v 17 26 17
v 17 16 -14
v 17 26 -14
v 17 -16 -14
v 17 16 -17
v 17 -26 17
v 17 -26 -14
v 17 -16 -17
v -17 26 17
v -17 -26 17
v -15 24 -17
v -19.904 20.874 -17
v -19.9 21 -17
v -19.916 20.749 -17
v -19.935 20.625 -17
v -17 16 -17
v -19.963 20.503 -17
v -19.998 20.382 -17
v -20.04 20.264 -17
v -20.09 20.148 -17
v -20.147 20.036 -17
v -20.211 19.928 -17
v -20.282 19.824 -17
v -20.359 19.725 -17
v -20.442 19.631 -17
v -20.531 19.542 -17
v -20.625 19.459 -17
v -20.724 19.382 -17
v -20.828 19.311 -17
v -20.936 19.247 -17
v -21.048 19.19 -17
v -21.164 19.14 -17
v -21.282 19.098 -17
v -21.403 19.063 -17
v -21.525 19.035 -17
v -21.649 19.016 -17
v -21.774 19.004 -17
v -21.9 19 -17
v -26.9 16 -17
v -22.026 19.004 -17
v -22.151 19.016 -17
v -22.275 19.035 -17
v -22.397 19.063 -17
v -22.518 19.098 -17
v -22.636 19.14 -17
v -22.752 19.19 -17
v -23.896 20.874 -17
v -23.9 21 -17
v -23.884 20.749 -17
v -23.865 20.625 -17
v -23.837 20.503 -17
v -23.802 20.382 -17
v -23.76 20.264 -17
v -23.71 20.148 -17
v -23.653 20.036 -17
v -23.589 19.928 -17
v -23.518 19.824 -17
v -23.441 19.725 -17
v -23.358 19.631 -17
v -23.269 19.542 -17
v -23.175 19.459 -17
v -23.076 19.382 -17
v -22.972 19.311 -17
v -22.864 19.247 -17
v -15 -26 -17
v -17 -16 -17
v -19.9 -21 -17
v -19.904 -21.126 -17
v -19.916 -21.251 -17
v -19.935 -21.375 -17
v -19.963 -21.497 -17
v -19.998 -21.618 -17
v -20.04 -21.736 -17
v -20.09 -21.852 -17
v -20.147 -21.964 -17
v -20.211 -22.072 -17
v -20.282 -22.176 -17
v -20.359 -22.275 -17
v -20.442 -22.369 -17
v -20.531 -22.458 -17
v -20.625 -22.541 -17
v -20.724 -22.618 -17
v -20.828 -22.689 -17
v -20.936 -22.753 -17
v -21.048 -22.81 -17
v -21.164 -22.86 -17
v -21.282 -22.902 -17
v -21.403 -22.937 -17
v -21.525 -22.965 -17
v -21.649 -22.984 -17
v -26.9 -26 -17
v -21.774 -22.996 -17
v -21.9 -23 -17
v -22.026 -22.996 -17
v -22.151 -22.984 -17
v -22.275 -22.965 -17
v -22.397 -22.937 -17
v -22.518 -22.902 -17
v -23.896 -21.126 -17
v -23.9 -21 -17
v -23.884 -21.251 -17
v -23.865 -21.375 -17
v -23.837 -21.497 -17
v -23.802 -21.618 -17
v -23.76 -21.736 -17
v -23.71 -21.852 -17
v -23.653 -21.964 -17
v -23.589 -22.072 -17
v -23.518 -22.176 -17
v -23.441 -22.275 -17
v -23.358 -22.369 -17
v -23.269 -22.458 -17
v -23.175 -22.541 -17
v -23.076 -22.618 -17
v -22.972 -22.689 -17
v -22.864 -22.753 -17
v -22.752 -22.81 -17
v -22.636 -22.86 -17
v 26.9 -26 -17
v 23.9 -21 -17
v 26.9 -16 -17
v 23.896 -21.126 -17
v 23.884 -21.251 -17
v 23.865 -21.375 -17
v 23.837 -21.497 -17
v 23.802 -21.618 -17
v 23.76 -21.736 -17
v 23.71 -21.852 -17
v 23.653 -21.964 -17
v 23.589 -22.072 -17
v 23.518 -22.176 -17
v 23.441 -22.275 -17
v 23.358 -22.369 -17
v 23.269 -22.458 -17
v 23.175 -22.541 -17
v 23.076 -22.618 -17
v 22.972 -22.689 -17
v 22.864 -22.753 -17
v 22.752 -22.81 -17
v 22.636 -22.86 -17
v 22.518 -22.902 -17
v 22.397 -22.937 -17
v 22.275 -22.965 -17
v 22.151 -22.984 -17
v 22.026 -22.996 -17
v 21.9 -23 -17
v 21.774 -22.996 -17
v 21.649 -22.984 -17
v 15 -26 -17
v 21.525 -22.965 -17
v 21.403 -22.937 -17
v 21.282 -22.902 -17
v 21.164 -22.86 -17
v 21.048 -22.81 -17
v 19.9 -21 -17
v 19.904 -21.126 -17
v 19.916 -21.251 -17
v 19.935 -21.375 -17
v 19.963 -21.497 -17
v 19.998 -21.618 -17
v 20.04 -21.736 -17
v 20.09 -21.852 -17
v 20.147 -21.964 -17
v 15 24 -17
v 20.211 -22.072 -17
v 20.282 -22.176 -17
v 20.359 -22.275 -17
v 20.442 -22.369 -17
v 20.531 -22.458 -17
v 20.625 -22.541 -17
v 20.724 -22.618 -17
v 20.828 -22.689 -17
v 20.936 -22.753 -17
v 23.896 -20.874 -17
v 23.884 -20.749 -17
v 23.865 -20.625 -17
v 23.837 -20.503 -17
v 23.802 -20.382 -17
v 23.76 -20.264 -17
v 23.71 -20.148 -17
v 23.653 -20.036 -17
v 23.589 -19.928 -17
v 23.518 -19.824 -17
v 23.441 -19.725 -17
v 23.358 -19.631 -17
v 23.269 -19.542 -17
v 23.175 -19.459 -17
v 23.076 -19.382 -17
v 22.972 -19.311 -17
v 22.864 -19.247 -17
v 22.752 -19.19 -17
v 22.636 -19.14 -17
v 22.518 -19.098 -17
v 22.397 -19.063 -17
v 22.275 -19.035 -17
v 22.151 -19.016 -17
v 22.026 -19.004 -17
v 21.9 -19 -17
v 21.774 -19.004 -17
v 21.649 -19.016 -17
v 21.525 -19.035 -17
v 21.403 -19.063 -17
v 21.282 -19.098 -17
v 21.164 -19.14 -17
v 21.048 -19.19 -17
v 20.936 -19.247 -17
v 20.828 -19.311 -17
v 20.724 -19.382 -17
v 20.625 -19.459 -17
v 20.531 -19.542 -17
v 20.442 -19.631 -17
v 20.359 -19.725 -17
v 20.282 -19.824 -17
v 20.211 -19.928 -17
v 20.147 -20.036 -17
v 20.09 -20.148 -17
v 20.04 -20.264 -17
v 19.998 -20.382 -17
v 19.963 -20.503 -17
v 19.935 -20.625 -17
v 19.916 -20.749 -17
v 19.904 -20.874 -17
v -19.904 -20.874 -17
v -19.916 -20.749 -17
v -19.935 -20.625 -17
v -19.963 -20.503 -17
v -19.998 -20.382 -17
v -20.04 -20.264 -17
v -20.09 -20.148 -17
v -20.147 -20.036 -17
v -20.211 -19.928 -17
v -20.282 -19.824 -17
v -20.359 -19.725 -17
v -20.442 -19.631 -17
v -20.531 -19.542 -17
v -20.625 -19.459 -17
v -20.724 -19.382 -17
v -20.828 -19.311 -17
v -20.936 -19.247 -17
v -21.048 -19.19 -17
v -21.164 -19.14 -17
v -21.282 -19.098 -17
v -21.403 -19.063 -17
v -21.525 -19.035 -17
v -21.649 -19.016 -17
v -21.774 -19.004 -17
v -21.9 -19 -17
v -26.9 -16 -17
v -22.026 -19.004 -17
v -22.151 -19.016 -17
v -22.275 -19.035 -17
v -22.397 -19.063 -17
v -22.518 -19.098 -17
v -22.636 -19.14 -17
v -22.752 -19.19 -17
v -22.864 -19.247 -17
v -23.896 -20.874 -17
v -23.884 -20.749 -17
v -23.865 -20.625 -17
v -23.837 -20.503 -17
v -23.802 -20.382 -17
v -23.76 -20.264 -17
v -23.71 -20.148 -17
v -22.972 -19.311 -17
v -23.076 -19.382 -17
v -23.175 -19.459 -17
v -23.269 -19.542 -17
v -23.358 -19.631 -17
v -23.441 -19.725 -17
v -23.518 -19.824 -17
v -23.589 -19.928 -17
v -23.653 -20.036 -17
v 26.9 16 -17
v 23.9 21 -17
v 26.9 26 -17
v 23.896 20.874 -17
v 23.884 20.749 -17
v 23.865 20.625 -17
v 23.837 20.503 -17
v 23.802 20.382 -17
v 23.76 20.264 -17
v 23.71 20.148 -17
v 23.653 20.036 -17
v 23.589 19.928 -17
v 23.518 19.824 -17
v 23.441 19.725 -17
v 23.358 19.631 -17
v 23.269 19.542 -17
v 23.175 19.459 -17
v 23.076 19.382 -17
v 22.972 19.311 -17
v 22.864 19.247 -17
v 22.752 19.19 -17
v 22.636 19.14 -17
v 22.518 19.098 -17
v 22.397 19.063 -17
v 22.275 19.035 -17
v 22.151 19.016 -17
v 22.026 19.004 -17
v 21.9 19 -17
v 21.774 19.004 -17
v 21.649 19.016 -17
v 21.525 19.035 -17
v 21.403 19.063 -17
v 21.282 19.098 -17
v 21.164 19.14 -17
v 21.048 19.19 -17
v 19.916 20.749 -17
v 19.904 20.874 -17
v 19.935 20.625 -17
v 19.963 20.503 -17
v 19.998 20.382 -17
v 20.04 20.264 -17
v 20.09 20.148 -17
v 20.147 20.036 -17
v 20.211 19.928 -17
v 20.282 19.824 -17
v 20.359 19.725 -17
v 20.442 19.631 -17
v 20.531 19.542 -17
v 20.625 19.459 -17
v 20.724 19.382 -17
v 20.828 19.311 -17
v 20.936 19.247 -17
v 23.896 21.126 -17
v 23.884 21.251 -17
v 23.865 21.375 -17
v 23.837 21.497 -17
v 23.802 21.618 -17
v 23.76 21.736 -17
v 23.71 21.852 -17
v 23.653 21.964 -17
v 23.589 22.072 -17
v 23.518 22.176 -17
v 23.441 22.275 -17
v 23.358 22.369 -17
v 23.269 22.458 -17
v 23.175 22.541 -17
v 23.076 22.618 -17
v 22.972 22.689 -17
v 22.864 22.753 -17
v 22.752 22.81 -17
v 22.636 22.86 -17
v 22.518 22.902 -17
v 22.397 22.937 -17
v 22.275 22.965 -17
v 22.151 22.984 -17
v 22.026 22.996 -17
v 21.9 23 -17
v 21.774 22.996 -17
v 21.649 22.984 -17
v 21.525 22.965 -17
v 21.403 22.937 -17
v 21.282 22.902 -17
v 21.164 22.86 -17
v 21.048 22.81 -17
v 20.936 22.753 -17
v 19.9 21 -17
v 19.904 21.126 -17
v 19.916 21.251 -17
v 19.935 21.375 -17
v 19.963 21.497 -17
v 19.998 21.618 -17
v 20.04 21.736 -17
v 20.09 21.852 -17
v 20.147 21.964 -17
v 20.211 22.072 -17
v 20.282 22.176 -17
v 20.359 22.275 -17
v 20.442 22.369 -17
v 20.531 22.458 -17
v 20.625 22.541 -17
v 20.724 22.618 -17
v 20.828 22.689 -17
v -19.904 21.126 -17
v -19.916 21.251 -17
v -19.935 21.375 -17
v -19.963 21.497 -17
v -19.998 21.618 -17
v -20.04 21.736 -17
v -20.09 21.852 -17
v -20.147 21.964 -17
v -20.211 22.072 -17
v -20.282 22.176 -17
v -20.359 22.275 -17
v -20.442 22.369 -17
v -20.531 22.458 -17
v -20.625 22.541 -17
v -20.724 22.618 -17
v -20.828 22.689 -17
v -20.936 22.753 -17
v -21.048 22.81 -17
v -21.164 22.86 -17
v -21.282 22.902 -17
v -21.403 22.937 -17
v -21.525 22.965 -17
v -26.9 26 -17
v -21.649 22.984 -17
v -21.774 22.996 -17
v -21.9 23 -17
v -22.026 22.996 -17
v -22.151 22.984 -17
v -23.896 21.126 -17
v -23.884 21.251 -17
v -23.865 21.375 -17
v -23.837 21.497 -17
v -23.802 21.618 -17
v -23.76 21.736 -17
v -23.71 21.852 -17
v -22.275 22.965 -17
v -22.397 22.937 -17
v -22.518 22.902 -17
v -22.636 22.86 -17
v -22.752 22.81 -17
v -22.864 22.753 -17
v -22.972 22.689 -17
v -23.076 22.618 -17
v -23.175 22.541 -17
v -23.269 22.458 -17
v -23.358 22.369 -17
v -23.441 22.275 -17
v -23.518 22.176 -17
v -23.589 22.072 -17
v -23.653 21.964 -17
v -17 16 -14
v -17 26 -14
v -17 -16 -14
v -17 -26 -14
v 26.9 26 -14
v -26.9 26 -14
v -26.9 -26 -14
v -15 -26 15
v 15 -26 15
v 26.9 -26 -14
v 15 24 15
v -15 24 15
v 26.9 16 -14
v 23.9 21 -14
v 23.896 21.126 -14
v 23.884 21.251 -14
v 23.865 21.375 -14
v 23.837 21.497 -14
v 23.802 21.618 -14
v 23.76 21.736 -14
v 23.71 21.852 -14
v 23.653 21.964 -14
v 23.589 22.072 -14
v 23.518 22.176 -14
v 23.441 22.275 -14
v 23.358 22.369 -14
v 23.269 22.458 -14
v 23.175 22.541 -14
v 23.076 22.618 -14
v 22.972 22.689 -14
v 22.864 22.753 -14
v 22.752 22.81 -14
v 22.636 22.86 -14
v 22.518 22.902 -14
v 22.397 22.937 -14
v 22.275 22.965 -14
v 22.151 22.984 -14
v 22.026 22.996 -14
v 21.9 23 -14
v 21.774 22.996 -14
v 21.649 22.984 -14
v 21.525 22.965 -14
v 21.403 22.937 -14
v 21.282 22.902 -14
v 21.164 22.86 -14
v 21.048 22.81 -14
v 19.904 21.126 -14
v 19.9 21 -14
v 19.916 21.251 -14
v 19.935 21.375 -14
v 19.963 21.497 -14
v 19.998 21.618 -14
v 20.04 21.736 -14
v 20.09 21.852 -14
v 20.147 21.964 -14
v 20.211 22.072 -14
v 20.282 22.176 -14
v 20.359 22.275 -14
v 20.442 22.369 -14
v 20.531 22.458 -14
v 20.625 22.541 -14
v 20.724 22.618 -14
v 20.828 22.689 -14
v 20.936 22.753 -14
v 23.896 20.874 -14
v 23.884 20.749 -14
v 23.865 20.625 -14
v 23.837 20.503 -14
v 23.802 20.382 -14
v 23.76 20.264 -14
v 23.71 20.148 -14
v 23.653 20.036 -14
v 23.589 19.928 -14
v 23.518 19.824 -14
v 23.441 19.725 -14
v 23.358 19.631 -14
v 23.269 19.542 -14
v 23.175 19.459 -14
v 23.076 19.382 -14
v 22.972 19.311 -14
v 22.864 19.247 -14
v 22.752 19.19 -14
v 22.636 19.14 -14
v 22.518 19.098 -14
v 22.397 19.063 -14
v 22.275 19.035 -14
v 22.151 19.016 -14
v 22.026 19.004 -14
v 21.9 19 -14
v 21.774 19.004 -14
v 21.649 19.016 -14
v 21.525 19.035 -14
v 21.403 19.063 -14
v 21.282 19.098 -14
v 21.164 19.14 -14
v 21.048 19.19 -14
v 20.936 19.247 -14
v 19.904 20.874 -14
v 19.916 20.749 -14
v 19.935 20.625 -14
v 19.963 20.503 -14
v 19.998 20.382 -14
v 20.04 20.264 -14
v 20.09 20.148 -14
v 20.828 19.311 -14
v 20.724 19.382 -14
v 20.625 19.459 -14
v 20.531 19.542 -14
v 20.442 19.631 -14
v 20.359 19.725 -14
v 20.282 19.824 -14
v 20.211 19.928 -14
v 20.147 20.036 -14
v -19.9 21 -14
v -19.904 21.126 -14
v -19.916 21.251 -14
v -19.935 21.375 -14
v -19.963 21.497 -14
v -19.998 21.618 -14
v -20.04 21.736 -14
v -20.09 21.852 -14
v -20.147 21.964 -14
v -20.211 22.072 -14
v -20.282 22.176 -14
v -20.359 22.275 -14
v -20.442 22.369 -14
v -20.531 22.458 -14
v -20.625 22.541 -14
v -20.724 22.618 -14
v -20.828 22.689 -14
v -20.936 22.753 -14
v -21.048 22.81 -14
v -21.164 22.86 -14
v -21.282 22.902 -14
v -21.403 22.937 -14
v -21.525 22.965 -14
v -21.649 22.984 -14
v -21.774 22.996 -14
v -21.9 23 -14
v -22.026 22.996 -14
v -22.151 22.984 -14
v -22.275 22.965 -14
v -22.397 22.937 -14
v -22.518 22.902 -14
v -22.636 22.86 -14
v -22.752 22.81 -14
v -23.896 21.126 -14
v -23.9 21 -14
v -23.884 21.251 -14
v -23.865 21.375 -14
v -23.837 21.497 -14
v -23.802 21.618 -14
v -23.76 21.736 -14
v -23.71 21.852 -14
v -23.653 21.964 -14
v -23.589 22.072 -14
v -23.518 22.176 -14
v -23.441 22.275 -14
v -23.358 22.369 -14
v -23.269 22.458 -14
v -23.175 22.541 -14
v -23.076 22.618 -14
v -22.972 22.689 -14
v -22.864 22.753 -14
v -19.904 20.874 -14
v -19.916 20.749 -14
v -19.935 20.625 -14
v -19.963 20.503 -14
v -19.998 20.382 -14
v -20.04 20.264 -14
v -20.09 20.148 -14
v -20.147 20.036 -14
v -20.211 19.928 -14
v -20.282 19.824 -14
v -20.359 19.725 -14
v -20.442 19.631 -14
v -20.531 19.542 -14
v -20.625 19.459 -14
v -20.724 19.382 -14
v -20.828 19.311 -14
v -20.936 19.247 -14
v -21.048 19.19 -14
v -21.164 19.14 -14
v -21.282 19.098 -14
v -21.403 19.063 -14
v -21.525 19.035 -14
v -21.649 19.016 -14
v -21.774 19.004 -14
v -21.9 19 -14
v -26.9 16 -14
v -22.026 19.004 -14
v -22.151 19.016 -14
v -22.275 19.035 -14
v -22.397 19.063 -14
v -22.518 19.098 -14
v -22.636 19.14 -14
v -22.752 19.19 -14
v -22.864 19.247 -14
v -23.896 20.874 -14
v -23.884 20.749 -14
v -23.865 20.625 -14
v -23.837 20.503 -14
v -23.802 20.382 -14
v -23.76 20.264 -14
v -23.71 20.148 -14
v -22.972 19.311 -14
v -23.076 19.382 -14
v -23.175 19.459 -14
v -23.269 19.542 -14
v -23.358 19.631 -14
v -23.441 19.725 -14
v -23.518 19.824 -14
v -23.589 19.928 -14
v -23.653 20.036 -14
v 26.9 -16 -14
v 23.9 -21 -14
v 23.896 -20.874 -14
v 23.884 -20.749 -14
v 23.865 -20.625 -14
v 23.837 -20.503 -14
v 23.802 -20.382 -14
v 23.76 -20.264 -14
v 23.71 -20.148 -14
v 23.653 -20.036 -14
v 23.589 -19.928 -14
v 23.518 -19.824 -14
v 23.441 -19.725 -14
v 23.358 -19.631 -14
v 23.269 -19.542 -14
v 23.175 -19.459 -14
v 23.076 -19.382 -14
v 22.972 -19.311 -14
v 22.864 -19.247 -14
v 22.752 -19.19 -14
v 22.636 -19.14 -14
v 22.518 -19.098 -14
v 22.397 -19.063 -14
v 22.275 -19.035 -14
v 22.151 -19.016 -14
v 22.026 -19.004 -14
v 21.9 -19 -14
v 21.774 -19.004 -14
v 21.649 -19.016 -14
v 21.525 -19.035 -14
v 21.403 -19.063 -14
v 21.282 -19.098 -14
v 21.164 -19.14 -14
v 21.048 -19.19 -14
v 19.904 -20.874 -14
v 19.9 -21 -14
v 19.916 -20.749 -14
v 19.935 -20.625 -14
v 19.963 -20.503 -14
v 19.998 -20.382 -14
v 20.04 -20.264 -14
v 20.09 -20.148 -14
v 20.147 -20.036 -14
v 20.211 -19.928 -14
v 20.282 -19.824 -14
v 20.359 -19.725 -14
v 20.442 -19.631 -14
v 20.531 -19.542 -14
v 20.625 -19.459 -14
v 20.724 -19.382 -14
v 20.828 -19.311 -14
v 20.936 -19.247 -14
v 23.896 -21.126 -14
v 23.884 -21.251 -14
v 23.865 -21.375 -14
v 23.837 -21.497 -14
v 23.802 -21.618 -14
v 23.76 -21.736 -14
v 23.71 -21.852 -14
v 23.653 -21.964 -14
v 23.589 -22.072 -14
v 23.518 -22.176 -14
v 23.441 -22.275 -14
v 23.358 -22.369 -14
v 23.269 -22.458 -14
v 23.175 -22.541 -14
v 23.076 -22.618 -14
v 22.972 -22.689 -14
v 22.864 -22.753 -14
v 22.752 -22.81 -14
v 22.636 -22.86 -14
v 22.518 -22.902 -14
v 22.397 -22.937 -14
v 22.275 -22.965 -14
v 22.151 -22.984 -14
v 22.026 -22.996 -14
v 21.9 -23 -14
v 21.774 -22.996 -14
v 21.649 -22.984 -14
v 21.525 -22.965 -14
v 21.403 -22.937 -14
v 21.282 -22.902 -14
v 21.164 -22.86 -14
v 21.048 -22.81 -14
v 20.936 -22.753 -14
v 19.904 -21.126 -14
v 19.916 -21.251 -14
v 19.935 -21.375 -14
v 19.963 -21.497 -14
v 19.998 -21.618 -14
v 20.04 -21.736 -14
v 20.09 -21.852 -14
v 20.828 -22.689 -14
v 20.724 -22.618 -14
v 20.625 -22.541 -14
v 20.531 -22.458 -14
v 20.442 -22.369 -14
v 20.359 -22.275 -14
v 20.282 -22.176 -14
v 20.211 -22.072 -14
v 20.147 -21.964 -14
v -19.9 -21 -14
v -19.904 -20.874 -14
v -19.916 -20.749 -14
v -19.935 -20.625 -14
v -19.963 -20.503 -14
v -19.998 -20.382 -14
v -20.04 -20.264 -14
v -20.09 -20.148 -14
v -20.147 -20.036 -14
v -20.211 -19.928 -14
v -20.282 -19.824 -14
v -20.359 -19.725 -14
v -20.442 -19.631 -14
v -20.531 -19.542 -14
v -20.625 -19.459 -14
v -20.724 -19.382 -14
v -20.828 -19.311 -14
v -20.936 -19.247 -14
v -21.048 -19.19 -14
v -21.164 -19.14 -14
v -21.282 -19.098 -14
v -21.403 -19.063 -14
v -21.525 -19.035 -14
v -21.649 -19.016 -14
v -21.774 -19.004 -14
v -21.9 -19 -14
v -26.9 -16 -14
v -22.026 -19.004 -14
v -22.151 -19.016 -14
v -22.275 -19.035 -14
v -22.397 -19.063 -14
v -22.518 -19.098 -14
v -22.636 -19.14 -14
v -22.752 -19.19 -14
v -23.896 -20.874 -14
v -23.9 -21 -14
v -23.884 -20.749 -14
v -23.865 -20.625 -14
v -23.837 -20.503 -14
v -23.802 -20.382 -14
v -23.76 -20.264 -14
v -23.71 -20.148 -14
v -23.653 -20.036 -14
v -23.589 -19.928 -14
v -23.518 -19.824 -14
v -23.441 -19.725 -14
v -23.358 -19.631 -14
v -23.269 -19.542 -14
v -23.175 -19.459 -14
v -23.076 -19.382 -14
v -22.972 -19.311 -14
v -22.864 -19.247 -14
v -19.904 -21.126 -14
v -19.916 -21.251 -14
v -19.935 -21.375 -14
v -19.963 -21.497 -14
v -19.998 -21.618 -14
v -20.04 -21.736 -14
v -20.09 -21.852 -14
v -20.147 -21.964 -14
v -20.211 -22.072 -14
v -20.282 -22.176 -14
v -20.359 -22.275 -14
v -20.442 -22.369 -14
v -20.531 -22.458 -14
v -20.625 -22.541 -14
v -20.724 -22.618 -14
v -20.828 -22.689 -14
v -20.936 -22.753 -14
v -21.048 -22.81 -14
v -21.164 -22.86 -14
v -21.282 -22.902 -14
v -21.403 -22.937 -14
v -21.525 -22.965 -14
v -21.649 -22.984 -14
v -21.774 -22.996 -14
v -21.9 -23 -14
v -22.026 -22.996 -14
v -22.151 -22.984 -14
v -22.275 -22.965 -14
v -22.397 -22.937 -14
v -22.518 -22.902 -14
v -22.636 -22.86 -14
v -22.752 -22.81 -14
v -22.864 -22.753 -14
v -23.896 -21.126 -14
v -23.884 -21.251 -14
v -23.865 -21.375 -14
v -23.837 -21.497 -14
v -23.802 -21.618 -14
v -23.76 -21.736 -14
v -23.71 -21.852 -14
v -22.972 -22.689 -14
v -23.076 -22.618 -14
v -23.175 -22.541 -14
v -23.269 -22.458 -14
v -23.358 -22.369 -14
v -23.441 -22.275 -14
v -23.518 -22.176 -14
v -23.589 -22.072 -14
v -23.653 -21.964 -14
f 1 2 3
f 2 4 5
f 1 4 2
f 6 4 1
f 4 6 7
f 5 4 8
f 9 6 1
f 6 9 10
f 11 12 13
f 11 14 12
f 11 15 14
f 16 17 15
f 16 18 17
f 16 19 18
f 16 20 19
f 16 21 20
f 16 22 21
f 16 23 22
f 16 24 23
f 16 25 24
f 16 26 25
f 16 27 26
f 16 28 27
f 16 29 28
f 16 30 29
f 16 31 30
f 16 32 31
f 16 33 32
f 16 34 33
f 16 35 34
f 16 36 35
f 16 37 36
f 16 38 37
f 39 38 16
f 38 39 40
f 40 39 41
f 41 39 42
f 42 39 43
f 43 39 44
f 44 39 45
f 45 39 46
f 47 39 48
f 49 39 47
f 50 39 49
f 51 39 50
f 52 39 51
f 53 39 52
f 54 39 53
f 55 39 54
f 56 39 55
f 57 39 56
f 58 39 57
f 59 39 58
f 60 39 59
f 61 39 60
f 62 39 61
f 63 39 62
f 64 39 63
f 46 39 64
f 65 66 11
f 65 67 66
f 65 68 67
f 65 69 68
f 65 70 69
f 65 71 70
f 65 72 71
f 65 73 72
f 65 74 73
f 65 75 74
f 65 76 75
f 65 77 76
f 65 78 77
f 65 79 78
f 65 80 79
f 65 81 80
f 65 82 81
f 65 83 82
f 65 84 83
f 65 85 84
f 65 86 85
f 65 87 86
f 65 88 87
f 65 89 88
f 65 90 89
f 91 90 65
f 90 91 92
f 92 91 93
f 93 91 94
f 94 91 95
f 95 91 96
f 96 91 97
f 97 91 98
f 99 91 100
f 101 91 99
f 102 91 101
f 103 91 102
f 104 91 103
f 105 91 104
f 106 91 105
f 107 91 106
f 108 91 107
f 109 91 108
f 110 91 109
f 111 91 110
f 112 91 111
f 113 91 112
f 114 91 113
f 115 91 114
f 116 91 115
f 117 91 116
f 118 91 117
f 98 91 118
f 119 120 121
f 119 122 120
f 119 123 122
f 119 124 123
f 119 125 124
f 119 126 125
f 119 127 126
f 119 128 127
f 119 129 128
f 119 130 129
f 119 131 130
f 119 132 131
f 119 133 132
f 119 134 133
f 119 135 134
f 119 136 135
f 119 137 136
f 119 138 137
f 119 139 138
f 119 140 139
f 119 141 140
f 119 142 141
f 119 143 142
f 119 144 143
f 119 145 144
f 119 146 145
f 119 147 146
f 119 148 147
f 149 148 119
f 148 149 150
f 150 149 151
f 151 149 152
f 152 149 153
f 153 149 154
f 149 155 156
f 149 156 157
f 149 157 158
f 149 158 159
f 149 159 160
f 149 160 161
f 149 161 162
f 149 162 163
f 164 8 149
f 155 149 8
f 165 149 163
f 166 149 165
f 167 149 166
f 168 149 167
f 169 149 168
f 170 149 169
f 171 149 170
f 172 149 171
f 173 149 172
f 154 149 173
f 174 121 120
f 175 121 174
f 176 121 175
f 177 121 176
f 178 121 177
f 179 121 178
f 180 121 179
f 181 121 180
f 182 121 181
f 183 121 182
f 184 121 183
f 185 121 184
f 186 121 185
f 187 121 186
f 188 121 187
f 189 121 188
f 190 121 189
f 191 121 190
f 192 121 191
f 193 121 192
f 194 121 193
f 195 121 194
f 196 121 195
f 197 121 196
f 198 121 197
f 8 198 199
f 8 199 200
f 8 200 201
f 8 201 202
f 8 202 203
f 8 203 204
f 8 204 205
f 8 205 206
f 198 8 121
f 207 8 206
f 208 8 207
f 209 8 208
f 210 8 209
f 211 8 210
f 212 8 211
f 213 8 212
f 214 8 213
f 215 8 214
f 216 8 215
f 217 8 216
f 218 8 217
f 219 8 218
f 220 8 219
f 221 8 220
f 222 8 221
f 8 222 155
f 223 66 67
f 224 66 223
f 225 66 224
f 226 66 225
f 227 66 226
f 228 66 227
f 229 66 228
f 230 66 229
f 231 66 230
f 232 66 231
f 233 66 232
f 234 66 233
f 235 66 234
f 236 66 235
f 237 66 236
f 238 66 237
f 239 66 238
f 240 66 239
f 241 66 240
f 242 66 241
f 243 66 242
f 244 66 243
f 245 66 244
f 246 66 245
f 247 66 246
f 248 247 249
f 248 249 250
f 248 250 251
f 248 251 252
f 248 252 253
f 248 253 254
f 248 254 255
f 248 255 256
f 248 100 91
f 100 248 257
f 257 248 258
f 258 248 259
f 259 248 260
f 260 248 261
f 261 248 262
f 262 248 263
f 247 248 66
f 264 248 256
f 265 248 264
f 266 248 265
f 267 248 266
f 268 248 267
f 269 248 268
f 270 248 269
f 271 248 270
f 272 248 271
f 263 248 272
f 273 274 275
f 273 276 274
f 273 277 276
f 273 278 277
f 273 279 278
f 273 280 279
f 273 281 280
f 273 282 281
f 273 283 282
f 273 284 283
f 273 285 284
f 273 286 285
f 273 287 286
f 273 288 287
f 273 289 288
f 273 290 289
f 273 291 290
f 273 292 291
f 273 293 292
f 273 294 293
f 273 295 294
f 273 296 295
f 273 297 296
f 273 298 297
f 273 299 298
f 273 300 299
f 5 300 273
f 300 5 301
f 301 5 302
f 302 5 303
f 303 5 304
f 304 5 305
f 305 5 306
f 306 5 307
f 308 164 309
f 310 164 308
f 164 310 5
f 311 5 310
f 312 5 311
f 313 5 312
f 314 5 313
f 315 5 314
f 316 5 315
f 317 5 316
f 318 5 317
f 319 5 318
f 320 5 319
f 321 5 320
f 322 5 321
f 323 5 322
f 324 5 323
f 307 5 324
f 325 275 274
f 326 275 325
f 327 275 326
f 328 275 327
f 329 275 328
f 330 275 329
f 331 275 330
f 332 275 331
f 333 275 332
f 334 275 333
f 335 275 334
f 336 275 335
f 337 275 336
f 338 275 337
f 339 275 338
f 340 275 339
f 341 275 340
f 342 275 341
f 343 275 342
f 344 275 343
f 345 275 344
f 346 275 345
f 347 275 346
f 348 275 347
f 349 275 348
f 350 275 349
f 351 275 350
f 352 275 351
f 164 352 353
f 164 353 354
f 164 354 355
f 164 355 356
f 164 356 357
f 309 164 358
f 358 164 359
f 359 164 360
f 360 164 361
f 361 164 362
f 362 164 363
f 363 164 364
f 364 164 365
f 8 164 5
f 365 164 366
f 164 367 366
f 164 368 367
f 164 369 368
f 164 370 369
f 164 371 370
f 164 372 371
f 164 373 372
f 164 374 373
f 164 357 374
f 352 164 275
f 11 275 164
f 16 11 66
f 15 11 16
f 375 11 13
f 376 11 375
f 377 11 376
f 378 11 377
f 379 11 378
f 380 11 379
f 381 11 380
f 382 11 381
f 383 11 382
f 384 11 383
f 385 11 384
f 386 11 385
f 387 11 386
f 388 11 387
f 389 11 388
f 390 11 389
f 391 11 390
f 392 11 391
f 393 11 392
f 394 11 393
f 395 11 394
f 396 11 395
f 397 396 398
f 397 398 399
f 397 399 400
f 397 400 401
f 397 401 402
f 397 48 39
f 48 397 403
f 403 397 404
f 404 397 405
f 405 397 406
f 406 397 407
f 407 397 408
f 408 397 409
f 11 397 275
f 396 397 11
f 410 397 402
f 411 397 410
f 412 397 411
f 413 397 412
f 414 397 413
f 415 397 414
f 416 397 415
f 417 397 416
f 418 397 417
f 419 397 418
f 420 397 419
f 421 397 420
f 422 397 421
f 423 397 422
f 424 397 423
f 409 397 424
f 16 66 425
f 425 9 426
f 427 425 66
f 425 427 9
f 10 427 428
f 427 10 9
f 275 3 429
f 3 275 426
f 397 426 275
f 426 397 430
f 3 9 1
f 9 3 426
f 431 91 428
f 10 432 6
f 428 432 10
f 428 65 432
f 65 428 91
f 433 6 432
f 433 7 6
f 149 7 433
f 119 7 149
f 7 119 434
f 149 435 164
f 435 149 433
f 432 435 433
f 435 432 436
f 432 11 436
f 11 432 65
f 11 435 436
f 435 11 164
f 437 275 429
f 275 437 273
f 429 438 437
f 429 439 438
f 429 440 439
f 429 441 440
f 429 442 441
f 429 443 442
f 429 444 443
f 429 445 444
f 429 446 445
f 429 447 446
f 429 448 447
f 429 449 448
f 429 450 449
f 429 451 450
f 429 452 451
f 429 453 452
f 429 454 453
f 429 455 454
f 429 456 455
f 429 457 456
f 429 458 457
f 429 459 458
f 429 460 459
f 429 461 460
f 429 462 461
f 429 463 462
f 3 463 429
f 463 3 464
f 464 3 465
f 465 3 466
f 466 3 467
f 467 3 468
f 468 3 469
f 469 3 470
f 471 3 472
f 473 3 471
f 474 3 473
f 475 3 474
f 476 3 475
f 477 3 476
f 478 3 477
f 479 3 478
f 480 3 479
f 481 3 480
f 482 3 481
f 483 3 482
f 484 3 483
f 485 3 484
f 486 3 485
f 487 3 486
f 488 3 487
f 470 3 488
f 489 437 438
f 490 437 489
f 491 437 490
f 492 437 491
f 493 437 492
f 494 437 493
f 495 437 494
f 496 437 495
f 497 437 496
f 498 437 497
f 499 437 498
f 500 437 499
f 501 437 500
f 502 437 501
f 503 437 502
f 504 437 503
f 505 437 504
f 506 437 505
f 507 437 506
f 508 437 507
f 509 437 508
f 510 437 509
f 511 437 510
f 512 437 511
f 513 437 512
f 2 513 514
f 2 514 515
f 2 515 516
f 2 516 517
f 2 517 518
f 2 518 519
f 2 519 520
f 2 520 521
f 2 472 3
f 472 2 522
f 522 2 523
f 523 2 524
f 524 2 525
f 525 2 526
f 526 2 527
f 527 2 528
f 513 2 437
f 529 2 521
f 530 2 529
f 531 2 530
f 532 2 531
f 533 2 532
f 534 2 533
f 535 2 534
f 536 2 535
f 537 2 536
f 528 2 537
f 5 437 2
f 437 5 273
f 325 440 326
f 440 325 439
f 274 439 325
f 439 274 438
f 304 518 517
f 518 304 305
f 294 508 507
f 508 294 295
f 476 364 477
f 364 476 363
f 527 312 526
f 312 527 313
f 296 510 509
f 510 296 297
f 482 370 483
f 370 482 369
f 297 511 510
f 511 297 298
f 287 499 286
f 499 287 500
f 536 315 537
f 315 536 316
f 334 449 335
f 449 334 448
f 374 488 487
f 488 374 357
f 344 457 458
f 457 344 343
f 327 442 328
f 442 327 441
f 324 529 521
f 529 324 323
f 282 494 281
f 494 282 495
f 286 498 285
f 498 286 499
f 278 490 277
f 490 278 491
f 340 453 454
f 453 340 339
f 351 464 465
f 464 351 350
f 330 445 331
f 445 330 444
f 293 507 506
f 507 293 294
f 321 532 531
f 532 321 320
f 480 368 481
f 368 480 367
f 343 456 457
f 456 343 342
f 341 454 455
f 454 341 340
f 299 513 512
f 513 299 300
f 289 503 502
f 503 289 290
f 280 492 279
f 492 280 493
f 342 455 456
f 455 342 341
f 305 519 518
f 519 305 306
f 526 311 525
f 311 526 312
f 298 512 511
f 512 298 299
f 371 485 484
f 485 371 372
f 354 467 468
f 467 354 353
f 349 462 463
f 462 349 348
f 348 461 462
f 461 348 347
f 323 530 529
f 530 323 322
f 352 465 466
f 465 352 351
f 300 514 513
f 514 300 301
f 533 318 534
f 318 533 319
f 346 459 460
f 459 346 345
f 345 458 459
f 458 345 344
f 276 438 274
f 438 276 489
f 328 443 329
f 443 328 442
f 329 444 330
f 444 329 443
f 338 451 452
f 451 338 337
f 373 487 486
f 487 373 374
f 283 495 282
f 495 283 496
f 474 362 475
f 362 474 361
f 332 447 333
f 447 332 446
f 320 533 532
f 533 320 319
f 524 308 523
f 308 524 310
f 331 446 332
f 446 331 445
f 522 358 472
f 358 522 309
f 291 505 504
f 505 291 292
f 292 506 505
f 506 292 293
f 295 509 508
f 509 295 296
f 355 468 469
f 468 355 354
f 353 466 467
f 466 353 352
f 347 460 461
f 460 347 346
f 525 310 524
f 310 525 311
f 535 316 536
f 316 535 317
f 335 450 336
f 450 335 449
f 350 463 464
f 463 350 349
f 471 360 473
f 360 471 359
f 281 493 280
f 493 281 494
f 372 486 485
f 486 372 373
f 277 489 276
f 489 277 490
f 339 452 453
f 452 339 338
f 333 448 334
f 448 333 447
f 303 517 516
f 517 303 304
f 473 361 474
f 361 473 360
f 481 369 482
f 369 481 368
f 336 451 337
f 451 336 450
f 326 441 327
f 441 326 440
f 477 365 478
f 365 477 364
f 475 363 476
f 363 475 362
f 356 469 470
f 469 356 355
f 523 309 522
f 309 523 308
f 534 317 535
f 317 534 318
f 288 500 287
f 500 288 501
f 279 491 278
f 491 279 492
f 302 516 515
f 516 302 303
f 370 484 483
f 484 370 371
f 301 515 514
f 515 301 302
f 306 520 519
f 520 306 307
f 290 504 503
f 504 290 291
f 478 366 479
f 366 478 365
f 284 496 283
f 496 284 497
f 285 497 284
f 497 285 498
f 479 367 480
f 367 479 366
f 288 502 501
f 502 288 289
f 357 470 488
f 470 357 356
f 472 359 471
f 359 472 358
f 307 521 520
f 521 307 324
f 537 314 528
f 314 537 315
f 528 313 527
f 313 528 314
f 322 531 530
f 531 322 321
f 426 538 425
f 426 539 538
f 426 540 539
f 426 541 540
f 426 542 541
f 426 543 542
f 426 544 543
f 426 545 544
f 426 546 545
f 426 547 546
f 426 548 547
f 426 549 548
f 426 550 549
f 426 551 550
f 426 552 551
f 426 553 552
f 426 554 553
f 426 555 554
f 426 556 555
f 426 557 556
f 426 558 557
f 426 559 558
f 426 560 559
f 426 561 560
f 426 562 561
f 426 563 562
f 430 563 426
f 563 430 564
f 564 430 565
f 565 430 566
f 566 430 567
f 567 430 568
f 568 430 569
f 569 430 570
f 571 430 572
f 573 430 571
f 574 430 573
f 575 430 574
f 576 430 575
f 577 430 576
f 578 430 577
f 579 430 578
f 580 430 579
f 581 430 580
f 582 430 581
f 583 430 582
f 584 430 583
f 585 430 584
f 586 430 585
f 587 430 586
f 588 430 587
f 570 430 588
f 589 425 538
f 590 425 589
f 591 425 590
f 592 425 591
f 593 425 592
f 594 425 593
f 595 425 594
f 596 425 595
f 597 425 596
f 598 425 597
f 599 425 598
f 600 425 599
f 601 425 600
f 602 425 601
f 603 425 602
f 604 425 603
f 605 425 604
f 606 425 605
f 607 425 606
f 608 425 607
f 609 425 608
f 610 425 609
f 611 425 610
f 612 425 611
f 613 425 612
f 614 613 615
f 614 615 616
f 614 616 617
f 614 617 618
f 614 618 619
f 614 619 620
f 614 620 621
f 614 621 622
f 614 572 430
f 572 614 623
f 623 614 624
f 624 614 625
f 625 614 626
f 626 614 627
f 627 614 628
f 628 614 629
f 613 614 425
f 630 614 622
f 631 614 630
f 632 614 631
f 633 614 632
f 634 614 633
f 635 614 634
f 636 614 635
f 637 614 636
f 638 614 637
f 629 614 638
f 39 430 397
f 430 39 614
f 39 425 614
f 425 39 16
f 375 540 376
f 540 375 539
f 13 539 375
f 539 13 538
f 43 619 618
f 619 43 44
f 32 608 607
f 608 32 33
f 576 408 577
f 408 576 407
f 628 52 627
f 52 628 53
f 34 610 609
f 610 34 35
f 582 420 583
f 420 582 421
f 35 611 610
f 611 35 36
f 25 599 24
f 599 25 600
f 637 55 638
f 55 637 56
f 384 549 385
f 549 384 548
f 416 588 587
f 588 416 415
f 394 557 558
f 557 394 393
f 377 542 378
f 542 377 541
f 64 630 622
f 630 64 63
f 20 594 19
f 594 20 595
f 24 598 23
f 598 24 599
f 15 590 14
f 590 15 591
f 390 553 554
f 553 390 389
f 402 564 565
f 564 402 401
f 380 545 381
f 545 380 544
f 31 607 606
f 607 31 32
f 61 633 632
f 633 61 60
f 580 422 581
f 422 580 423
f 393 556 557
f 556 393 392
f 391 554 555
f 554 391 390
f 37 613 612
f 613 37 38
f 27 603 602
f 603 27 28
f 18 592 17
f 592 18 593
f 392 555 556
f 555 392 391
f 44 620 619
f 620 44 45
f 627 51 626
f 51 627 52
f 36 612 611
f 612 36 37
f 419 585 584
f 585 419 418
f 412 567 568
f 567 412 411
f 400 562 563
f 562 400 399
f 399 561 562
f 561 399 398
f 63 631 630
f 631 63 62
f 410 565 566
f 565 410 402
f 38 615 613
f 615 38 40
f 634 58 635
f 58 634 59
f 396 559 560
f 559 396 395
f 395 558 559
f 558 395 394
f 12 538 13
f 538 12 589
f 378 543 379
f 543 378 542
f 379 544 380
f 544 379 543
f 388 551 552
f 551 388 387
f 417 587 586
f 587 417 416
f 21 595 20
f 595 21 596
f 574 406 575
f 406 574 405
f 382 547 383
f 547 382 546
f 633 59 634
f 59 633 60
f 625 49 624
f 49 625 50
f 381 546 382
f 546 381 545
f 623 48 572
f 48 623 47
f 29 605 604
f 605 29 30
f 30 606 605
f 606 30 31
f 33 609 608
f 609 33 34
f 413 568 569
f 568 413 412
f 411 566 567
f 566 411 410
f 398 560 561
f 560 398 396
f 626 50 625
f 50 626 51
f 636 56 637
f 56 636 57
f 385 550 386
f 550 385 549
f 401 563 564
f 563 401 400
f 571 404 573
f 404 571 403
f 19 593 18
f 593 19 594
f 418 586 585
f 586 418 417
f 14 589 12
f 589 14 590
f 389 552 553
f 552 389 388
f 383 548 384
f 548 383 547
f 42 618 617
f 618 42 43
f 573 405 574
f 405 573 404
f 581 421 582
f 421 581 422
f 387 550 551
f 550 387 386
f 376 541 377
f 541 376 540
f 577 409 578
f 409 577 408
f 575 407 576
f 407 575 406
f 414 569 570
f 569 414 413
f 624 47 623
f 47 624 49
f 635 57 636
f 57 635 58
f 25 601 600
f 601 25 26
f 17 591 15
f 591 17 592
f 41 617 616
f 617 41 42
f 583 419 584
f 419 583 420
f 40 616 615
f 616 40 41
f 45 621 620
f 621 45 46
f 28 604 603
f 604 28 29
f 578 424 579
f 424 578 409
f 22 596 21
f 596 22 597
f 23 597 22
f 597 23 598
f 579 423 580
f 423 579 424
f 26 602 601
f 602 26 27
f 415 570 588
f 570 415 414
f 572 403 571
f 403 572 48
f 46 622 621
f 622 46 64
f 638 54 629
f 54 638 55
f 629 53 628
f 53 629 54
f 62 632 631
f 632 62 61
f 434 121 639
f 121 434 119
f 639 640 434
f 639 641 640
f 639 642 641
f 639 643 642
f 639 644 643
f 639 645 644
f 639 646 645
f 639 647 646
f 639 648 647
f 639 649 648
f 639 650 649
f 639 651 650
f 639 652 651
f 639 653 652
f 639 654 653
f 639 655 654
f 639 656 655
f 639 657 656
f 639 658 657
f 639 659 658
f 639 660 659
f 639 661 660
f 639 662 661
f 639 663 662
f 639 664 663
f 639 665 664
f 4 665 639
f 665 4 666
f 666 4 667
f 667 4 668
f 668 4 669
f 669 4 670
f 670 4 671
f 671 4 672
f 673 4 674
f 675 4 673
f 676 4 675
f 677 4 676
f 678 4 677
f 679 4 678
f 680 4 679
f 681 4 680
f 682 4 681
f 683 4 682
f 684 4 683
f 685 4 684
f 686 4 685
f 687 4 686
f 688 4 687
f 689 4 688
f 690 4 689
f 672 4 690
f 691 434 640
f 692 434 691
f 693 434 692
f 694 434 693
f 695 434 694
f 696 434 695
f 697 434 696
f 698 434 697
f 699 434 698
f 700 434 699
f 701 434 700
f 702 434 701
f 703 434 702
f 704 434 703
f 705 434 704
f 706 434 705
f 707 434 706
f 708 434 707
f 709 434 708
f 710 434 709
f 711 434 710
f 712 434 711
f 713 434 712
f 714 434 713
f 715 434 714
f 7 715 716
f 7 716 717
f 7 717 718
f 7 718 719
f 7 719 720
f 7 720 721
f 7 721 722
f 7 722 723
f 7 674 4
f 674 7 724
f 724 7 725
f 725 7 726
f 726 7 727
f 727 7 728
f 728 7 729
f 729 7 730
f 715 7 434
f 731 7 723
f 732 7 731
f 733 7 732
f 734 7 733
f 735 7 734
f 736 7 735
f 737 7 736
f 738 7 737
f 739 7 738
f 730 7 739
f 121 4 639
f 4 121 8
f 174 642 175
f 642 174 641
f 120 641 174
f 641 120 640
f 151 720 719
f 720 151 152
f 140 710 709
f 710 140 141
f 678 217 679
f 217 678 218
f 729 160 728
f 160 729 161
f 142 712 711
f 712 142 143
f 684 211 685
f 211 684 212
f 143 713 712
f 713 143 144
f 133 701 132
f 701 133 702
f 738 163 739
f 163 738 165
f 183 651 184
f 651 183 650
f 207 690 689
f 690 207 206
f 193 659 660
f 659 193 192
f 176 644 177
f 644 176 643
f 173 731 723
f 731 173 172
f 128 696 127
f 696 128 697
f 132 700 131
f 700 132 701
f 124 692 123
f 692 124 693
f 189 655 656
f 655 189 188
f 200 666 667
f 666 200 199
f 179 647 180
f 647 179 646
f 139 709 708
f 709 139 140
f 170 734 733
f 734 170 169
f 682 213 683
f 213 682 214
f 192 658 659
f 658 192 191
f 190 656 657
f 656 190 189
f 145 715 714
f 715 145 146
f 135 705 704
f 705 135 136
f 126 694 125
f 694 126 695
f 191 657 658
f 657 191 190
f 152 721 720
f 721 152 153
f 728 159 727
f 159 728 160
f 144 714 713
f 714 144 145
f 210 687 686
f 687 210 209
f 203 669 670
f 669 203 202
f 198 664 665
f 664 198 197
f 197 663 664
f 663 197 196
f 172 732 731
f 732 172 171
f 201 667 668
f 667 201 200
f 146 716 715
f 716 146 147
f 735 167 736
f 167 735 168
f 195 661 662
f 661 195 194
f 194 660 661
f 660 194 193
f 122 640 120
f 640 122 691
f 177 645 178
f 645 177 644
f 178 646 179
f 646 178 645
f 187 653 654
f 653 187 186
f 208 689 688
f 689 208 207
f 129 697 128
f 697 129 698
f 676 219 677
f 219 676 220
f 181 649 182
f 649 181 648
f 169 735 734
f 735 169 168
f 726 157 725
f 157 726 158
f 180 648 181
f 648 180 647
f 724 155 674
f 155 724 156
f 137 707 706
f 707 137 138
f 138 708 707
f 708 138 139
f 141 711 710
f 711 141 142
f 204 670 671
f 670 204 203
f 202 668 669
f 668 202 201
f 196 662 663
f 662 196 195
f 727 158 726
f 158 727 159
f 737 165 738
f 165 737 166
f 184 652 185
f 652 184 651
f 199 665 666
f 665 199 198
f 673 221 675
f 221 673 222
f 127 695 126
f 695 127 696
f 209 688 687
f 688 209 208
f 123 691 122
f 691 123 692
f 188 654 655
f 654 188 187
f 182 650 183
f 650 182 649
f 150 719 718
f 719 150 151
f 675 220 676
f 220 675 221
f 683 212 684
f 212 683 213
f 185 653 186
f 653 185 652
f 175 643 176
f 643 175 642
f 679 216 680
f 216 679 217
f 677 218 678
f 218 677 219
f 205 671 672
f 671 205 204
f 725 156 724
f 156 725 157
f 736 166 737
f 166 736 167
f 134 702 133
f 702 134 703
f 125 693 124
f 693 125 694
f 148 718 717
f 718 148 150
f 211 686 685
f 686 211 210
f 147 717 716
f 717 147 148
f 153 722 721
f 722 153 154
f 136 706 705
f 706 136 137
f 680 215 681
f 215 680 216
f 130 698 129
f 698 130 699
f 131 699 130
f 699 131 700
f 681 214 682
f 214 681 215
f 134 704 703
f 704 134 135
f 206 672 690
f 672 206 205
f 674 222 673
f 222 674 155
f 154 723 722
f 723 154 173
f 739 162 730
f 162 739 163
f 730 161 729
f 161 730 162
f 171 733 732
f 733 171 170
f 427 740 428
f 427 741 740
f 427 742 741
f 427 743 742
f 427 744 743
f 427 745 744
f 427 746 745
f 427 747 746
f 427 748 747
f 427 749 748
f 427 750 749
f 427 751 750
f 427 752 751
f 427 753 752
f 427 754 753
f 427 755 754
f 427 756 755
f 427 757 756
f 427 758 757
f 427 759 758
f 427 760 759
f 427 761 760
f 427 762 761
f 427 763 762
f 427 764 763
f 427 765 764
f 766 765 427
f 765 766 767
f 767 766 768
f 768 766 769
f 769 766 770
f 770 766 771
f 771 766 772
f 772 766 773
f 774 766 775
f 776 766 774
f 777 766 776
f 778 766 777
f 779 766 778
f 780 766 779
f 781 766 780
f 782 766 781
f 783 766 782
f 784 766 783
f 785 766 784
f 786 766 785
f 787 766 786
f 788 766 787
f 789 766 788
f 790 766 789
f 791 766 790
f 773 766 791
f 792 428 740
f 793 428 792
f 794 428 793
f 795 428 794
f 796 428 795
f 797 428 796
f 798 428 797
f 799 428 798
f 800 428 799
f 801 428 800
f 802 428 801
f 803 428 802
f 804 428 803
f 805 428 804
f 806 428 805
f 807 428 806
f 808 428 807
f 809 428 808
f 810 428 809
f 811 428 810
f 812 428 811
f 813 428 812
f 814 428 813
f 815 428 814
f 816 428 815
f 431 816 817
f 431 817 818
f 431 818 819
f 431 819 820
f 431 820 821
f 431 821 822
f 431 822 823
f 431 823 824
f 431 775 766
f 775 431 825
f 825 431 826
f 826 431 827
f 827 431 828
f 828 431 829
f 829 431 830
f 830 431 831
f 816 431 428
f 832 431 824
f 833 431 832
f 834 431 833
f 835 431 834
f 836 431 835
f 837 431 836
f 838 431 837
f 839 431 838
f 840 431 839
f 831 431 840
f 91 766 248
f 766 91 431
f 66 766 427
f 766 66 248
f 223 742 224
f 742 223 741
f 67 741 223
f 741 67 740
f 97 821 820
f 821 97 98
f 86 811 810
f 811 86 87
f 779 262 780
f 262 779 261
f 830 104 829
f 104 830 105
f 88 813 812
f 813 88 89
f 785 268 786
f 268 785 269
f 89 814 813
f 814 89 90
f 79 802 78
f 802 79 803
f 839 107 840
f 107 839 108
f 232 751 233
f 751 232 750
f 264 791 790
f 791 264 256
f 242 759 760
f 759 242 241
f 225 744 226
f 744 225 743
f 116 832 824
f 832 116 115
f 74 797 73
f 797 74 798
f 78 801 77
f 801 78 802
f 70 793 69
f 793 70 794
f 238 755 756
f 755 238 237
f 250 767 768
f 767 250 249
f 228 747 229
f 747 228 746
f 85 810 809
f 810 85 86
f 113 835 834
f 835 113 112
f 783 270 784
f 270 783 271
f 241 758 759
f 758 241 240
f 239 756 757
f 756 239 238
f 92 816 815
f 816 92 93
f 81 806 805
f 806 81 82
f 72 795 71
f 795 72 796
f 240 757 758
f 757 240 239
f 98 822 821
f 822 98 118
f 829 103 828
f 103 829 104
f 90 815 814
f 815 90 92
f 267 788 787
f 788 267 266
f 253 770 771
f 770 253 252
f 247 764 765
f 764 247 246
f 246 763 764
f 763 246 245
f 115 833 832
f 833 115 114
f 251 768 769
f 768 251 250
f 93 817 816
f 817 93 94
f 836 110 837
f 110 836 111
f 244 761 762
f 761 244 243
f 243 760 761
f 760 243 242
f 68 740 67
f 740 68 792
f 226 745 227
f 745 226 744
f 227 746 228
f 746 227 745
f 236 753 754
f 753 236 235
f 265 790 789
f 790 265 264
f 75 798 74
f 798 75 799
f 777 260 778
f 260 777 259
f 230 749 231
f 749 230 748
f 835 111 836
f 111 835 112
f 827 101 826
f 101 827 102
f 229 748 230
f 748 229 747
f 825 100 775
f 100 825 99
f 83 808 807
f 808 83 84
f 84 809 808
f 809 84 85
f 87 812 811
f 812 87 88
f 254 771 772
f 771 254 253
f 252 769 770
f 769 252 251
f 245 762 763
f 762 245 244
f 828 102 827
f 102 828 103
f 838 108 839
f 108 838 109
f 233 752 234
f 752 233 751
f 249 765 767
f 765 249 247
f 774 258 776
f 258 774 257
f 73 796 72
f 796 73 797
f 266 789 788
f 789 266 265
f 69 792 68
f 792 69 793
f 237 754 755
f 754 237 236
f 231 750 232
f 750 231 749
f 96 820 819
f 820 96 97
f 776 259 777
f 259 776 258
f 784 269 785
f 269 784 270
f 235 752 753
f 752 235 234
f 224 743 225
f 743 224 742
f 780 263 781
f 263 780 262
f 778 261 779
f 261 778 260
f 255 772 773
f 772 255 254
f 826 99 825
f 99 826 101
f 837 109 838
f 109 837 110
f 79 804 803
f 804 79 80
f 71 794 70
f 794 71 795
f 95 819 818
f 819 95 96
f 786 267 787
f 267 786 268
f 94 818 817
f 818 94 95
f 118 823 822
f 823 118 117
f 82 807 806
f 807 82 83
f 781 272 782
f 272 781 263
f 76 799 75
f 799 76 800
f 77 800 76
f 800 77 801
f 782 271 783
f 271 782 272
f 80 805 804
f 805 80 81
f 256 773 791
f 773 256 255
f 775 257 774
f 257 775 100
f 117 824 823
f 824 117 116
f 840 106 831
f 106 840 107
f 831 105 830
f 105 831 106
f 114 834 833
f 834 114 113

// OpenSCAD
module tab(){
	difference()
	{
		union()
		{
			color("yellow") cube([10, 10, 3], center=true);
			//translate([-5,-5,1.4]) tabSupport();
			//translate([-5,4.2,1.4]) tabSupport();
		}
		cylinder(d=4,h=5,center=true, $fn=100);
	}
}

difference()
{
	cube([34, 52, 34], center=true);
	translate([0,-1,-1])  cube([30, 50, 32], center=true);
}

color("blue") translate([21.9, 21, -15.5]) tab();
color("orange") translate([-21.9, 21, -15.5]) tab();
color("green") translate([21.9, -21, -15.5]) tab();
color("red") translate([-21.9, -21, -15.5]) tab();
